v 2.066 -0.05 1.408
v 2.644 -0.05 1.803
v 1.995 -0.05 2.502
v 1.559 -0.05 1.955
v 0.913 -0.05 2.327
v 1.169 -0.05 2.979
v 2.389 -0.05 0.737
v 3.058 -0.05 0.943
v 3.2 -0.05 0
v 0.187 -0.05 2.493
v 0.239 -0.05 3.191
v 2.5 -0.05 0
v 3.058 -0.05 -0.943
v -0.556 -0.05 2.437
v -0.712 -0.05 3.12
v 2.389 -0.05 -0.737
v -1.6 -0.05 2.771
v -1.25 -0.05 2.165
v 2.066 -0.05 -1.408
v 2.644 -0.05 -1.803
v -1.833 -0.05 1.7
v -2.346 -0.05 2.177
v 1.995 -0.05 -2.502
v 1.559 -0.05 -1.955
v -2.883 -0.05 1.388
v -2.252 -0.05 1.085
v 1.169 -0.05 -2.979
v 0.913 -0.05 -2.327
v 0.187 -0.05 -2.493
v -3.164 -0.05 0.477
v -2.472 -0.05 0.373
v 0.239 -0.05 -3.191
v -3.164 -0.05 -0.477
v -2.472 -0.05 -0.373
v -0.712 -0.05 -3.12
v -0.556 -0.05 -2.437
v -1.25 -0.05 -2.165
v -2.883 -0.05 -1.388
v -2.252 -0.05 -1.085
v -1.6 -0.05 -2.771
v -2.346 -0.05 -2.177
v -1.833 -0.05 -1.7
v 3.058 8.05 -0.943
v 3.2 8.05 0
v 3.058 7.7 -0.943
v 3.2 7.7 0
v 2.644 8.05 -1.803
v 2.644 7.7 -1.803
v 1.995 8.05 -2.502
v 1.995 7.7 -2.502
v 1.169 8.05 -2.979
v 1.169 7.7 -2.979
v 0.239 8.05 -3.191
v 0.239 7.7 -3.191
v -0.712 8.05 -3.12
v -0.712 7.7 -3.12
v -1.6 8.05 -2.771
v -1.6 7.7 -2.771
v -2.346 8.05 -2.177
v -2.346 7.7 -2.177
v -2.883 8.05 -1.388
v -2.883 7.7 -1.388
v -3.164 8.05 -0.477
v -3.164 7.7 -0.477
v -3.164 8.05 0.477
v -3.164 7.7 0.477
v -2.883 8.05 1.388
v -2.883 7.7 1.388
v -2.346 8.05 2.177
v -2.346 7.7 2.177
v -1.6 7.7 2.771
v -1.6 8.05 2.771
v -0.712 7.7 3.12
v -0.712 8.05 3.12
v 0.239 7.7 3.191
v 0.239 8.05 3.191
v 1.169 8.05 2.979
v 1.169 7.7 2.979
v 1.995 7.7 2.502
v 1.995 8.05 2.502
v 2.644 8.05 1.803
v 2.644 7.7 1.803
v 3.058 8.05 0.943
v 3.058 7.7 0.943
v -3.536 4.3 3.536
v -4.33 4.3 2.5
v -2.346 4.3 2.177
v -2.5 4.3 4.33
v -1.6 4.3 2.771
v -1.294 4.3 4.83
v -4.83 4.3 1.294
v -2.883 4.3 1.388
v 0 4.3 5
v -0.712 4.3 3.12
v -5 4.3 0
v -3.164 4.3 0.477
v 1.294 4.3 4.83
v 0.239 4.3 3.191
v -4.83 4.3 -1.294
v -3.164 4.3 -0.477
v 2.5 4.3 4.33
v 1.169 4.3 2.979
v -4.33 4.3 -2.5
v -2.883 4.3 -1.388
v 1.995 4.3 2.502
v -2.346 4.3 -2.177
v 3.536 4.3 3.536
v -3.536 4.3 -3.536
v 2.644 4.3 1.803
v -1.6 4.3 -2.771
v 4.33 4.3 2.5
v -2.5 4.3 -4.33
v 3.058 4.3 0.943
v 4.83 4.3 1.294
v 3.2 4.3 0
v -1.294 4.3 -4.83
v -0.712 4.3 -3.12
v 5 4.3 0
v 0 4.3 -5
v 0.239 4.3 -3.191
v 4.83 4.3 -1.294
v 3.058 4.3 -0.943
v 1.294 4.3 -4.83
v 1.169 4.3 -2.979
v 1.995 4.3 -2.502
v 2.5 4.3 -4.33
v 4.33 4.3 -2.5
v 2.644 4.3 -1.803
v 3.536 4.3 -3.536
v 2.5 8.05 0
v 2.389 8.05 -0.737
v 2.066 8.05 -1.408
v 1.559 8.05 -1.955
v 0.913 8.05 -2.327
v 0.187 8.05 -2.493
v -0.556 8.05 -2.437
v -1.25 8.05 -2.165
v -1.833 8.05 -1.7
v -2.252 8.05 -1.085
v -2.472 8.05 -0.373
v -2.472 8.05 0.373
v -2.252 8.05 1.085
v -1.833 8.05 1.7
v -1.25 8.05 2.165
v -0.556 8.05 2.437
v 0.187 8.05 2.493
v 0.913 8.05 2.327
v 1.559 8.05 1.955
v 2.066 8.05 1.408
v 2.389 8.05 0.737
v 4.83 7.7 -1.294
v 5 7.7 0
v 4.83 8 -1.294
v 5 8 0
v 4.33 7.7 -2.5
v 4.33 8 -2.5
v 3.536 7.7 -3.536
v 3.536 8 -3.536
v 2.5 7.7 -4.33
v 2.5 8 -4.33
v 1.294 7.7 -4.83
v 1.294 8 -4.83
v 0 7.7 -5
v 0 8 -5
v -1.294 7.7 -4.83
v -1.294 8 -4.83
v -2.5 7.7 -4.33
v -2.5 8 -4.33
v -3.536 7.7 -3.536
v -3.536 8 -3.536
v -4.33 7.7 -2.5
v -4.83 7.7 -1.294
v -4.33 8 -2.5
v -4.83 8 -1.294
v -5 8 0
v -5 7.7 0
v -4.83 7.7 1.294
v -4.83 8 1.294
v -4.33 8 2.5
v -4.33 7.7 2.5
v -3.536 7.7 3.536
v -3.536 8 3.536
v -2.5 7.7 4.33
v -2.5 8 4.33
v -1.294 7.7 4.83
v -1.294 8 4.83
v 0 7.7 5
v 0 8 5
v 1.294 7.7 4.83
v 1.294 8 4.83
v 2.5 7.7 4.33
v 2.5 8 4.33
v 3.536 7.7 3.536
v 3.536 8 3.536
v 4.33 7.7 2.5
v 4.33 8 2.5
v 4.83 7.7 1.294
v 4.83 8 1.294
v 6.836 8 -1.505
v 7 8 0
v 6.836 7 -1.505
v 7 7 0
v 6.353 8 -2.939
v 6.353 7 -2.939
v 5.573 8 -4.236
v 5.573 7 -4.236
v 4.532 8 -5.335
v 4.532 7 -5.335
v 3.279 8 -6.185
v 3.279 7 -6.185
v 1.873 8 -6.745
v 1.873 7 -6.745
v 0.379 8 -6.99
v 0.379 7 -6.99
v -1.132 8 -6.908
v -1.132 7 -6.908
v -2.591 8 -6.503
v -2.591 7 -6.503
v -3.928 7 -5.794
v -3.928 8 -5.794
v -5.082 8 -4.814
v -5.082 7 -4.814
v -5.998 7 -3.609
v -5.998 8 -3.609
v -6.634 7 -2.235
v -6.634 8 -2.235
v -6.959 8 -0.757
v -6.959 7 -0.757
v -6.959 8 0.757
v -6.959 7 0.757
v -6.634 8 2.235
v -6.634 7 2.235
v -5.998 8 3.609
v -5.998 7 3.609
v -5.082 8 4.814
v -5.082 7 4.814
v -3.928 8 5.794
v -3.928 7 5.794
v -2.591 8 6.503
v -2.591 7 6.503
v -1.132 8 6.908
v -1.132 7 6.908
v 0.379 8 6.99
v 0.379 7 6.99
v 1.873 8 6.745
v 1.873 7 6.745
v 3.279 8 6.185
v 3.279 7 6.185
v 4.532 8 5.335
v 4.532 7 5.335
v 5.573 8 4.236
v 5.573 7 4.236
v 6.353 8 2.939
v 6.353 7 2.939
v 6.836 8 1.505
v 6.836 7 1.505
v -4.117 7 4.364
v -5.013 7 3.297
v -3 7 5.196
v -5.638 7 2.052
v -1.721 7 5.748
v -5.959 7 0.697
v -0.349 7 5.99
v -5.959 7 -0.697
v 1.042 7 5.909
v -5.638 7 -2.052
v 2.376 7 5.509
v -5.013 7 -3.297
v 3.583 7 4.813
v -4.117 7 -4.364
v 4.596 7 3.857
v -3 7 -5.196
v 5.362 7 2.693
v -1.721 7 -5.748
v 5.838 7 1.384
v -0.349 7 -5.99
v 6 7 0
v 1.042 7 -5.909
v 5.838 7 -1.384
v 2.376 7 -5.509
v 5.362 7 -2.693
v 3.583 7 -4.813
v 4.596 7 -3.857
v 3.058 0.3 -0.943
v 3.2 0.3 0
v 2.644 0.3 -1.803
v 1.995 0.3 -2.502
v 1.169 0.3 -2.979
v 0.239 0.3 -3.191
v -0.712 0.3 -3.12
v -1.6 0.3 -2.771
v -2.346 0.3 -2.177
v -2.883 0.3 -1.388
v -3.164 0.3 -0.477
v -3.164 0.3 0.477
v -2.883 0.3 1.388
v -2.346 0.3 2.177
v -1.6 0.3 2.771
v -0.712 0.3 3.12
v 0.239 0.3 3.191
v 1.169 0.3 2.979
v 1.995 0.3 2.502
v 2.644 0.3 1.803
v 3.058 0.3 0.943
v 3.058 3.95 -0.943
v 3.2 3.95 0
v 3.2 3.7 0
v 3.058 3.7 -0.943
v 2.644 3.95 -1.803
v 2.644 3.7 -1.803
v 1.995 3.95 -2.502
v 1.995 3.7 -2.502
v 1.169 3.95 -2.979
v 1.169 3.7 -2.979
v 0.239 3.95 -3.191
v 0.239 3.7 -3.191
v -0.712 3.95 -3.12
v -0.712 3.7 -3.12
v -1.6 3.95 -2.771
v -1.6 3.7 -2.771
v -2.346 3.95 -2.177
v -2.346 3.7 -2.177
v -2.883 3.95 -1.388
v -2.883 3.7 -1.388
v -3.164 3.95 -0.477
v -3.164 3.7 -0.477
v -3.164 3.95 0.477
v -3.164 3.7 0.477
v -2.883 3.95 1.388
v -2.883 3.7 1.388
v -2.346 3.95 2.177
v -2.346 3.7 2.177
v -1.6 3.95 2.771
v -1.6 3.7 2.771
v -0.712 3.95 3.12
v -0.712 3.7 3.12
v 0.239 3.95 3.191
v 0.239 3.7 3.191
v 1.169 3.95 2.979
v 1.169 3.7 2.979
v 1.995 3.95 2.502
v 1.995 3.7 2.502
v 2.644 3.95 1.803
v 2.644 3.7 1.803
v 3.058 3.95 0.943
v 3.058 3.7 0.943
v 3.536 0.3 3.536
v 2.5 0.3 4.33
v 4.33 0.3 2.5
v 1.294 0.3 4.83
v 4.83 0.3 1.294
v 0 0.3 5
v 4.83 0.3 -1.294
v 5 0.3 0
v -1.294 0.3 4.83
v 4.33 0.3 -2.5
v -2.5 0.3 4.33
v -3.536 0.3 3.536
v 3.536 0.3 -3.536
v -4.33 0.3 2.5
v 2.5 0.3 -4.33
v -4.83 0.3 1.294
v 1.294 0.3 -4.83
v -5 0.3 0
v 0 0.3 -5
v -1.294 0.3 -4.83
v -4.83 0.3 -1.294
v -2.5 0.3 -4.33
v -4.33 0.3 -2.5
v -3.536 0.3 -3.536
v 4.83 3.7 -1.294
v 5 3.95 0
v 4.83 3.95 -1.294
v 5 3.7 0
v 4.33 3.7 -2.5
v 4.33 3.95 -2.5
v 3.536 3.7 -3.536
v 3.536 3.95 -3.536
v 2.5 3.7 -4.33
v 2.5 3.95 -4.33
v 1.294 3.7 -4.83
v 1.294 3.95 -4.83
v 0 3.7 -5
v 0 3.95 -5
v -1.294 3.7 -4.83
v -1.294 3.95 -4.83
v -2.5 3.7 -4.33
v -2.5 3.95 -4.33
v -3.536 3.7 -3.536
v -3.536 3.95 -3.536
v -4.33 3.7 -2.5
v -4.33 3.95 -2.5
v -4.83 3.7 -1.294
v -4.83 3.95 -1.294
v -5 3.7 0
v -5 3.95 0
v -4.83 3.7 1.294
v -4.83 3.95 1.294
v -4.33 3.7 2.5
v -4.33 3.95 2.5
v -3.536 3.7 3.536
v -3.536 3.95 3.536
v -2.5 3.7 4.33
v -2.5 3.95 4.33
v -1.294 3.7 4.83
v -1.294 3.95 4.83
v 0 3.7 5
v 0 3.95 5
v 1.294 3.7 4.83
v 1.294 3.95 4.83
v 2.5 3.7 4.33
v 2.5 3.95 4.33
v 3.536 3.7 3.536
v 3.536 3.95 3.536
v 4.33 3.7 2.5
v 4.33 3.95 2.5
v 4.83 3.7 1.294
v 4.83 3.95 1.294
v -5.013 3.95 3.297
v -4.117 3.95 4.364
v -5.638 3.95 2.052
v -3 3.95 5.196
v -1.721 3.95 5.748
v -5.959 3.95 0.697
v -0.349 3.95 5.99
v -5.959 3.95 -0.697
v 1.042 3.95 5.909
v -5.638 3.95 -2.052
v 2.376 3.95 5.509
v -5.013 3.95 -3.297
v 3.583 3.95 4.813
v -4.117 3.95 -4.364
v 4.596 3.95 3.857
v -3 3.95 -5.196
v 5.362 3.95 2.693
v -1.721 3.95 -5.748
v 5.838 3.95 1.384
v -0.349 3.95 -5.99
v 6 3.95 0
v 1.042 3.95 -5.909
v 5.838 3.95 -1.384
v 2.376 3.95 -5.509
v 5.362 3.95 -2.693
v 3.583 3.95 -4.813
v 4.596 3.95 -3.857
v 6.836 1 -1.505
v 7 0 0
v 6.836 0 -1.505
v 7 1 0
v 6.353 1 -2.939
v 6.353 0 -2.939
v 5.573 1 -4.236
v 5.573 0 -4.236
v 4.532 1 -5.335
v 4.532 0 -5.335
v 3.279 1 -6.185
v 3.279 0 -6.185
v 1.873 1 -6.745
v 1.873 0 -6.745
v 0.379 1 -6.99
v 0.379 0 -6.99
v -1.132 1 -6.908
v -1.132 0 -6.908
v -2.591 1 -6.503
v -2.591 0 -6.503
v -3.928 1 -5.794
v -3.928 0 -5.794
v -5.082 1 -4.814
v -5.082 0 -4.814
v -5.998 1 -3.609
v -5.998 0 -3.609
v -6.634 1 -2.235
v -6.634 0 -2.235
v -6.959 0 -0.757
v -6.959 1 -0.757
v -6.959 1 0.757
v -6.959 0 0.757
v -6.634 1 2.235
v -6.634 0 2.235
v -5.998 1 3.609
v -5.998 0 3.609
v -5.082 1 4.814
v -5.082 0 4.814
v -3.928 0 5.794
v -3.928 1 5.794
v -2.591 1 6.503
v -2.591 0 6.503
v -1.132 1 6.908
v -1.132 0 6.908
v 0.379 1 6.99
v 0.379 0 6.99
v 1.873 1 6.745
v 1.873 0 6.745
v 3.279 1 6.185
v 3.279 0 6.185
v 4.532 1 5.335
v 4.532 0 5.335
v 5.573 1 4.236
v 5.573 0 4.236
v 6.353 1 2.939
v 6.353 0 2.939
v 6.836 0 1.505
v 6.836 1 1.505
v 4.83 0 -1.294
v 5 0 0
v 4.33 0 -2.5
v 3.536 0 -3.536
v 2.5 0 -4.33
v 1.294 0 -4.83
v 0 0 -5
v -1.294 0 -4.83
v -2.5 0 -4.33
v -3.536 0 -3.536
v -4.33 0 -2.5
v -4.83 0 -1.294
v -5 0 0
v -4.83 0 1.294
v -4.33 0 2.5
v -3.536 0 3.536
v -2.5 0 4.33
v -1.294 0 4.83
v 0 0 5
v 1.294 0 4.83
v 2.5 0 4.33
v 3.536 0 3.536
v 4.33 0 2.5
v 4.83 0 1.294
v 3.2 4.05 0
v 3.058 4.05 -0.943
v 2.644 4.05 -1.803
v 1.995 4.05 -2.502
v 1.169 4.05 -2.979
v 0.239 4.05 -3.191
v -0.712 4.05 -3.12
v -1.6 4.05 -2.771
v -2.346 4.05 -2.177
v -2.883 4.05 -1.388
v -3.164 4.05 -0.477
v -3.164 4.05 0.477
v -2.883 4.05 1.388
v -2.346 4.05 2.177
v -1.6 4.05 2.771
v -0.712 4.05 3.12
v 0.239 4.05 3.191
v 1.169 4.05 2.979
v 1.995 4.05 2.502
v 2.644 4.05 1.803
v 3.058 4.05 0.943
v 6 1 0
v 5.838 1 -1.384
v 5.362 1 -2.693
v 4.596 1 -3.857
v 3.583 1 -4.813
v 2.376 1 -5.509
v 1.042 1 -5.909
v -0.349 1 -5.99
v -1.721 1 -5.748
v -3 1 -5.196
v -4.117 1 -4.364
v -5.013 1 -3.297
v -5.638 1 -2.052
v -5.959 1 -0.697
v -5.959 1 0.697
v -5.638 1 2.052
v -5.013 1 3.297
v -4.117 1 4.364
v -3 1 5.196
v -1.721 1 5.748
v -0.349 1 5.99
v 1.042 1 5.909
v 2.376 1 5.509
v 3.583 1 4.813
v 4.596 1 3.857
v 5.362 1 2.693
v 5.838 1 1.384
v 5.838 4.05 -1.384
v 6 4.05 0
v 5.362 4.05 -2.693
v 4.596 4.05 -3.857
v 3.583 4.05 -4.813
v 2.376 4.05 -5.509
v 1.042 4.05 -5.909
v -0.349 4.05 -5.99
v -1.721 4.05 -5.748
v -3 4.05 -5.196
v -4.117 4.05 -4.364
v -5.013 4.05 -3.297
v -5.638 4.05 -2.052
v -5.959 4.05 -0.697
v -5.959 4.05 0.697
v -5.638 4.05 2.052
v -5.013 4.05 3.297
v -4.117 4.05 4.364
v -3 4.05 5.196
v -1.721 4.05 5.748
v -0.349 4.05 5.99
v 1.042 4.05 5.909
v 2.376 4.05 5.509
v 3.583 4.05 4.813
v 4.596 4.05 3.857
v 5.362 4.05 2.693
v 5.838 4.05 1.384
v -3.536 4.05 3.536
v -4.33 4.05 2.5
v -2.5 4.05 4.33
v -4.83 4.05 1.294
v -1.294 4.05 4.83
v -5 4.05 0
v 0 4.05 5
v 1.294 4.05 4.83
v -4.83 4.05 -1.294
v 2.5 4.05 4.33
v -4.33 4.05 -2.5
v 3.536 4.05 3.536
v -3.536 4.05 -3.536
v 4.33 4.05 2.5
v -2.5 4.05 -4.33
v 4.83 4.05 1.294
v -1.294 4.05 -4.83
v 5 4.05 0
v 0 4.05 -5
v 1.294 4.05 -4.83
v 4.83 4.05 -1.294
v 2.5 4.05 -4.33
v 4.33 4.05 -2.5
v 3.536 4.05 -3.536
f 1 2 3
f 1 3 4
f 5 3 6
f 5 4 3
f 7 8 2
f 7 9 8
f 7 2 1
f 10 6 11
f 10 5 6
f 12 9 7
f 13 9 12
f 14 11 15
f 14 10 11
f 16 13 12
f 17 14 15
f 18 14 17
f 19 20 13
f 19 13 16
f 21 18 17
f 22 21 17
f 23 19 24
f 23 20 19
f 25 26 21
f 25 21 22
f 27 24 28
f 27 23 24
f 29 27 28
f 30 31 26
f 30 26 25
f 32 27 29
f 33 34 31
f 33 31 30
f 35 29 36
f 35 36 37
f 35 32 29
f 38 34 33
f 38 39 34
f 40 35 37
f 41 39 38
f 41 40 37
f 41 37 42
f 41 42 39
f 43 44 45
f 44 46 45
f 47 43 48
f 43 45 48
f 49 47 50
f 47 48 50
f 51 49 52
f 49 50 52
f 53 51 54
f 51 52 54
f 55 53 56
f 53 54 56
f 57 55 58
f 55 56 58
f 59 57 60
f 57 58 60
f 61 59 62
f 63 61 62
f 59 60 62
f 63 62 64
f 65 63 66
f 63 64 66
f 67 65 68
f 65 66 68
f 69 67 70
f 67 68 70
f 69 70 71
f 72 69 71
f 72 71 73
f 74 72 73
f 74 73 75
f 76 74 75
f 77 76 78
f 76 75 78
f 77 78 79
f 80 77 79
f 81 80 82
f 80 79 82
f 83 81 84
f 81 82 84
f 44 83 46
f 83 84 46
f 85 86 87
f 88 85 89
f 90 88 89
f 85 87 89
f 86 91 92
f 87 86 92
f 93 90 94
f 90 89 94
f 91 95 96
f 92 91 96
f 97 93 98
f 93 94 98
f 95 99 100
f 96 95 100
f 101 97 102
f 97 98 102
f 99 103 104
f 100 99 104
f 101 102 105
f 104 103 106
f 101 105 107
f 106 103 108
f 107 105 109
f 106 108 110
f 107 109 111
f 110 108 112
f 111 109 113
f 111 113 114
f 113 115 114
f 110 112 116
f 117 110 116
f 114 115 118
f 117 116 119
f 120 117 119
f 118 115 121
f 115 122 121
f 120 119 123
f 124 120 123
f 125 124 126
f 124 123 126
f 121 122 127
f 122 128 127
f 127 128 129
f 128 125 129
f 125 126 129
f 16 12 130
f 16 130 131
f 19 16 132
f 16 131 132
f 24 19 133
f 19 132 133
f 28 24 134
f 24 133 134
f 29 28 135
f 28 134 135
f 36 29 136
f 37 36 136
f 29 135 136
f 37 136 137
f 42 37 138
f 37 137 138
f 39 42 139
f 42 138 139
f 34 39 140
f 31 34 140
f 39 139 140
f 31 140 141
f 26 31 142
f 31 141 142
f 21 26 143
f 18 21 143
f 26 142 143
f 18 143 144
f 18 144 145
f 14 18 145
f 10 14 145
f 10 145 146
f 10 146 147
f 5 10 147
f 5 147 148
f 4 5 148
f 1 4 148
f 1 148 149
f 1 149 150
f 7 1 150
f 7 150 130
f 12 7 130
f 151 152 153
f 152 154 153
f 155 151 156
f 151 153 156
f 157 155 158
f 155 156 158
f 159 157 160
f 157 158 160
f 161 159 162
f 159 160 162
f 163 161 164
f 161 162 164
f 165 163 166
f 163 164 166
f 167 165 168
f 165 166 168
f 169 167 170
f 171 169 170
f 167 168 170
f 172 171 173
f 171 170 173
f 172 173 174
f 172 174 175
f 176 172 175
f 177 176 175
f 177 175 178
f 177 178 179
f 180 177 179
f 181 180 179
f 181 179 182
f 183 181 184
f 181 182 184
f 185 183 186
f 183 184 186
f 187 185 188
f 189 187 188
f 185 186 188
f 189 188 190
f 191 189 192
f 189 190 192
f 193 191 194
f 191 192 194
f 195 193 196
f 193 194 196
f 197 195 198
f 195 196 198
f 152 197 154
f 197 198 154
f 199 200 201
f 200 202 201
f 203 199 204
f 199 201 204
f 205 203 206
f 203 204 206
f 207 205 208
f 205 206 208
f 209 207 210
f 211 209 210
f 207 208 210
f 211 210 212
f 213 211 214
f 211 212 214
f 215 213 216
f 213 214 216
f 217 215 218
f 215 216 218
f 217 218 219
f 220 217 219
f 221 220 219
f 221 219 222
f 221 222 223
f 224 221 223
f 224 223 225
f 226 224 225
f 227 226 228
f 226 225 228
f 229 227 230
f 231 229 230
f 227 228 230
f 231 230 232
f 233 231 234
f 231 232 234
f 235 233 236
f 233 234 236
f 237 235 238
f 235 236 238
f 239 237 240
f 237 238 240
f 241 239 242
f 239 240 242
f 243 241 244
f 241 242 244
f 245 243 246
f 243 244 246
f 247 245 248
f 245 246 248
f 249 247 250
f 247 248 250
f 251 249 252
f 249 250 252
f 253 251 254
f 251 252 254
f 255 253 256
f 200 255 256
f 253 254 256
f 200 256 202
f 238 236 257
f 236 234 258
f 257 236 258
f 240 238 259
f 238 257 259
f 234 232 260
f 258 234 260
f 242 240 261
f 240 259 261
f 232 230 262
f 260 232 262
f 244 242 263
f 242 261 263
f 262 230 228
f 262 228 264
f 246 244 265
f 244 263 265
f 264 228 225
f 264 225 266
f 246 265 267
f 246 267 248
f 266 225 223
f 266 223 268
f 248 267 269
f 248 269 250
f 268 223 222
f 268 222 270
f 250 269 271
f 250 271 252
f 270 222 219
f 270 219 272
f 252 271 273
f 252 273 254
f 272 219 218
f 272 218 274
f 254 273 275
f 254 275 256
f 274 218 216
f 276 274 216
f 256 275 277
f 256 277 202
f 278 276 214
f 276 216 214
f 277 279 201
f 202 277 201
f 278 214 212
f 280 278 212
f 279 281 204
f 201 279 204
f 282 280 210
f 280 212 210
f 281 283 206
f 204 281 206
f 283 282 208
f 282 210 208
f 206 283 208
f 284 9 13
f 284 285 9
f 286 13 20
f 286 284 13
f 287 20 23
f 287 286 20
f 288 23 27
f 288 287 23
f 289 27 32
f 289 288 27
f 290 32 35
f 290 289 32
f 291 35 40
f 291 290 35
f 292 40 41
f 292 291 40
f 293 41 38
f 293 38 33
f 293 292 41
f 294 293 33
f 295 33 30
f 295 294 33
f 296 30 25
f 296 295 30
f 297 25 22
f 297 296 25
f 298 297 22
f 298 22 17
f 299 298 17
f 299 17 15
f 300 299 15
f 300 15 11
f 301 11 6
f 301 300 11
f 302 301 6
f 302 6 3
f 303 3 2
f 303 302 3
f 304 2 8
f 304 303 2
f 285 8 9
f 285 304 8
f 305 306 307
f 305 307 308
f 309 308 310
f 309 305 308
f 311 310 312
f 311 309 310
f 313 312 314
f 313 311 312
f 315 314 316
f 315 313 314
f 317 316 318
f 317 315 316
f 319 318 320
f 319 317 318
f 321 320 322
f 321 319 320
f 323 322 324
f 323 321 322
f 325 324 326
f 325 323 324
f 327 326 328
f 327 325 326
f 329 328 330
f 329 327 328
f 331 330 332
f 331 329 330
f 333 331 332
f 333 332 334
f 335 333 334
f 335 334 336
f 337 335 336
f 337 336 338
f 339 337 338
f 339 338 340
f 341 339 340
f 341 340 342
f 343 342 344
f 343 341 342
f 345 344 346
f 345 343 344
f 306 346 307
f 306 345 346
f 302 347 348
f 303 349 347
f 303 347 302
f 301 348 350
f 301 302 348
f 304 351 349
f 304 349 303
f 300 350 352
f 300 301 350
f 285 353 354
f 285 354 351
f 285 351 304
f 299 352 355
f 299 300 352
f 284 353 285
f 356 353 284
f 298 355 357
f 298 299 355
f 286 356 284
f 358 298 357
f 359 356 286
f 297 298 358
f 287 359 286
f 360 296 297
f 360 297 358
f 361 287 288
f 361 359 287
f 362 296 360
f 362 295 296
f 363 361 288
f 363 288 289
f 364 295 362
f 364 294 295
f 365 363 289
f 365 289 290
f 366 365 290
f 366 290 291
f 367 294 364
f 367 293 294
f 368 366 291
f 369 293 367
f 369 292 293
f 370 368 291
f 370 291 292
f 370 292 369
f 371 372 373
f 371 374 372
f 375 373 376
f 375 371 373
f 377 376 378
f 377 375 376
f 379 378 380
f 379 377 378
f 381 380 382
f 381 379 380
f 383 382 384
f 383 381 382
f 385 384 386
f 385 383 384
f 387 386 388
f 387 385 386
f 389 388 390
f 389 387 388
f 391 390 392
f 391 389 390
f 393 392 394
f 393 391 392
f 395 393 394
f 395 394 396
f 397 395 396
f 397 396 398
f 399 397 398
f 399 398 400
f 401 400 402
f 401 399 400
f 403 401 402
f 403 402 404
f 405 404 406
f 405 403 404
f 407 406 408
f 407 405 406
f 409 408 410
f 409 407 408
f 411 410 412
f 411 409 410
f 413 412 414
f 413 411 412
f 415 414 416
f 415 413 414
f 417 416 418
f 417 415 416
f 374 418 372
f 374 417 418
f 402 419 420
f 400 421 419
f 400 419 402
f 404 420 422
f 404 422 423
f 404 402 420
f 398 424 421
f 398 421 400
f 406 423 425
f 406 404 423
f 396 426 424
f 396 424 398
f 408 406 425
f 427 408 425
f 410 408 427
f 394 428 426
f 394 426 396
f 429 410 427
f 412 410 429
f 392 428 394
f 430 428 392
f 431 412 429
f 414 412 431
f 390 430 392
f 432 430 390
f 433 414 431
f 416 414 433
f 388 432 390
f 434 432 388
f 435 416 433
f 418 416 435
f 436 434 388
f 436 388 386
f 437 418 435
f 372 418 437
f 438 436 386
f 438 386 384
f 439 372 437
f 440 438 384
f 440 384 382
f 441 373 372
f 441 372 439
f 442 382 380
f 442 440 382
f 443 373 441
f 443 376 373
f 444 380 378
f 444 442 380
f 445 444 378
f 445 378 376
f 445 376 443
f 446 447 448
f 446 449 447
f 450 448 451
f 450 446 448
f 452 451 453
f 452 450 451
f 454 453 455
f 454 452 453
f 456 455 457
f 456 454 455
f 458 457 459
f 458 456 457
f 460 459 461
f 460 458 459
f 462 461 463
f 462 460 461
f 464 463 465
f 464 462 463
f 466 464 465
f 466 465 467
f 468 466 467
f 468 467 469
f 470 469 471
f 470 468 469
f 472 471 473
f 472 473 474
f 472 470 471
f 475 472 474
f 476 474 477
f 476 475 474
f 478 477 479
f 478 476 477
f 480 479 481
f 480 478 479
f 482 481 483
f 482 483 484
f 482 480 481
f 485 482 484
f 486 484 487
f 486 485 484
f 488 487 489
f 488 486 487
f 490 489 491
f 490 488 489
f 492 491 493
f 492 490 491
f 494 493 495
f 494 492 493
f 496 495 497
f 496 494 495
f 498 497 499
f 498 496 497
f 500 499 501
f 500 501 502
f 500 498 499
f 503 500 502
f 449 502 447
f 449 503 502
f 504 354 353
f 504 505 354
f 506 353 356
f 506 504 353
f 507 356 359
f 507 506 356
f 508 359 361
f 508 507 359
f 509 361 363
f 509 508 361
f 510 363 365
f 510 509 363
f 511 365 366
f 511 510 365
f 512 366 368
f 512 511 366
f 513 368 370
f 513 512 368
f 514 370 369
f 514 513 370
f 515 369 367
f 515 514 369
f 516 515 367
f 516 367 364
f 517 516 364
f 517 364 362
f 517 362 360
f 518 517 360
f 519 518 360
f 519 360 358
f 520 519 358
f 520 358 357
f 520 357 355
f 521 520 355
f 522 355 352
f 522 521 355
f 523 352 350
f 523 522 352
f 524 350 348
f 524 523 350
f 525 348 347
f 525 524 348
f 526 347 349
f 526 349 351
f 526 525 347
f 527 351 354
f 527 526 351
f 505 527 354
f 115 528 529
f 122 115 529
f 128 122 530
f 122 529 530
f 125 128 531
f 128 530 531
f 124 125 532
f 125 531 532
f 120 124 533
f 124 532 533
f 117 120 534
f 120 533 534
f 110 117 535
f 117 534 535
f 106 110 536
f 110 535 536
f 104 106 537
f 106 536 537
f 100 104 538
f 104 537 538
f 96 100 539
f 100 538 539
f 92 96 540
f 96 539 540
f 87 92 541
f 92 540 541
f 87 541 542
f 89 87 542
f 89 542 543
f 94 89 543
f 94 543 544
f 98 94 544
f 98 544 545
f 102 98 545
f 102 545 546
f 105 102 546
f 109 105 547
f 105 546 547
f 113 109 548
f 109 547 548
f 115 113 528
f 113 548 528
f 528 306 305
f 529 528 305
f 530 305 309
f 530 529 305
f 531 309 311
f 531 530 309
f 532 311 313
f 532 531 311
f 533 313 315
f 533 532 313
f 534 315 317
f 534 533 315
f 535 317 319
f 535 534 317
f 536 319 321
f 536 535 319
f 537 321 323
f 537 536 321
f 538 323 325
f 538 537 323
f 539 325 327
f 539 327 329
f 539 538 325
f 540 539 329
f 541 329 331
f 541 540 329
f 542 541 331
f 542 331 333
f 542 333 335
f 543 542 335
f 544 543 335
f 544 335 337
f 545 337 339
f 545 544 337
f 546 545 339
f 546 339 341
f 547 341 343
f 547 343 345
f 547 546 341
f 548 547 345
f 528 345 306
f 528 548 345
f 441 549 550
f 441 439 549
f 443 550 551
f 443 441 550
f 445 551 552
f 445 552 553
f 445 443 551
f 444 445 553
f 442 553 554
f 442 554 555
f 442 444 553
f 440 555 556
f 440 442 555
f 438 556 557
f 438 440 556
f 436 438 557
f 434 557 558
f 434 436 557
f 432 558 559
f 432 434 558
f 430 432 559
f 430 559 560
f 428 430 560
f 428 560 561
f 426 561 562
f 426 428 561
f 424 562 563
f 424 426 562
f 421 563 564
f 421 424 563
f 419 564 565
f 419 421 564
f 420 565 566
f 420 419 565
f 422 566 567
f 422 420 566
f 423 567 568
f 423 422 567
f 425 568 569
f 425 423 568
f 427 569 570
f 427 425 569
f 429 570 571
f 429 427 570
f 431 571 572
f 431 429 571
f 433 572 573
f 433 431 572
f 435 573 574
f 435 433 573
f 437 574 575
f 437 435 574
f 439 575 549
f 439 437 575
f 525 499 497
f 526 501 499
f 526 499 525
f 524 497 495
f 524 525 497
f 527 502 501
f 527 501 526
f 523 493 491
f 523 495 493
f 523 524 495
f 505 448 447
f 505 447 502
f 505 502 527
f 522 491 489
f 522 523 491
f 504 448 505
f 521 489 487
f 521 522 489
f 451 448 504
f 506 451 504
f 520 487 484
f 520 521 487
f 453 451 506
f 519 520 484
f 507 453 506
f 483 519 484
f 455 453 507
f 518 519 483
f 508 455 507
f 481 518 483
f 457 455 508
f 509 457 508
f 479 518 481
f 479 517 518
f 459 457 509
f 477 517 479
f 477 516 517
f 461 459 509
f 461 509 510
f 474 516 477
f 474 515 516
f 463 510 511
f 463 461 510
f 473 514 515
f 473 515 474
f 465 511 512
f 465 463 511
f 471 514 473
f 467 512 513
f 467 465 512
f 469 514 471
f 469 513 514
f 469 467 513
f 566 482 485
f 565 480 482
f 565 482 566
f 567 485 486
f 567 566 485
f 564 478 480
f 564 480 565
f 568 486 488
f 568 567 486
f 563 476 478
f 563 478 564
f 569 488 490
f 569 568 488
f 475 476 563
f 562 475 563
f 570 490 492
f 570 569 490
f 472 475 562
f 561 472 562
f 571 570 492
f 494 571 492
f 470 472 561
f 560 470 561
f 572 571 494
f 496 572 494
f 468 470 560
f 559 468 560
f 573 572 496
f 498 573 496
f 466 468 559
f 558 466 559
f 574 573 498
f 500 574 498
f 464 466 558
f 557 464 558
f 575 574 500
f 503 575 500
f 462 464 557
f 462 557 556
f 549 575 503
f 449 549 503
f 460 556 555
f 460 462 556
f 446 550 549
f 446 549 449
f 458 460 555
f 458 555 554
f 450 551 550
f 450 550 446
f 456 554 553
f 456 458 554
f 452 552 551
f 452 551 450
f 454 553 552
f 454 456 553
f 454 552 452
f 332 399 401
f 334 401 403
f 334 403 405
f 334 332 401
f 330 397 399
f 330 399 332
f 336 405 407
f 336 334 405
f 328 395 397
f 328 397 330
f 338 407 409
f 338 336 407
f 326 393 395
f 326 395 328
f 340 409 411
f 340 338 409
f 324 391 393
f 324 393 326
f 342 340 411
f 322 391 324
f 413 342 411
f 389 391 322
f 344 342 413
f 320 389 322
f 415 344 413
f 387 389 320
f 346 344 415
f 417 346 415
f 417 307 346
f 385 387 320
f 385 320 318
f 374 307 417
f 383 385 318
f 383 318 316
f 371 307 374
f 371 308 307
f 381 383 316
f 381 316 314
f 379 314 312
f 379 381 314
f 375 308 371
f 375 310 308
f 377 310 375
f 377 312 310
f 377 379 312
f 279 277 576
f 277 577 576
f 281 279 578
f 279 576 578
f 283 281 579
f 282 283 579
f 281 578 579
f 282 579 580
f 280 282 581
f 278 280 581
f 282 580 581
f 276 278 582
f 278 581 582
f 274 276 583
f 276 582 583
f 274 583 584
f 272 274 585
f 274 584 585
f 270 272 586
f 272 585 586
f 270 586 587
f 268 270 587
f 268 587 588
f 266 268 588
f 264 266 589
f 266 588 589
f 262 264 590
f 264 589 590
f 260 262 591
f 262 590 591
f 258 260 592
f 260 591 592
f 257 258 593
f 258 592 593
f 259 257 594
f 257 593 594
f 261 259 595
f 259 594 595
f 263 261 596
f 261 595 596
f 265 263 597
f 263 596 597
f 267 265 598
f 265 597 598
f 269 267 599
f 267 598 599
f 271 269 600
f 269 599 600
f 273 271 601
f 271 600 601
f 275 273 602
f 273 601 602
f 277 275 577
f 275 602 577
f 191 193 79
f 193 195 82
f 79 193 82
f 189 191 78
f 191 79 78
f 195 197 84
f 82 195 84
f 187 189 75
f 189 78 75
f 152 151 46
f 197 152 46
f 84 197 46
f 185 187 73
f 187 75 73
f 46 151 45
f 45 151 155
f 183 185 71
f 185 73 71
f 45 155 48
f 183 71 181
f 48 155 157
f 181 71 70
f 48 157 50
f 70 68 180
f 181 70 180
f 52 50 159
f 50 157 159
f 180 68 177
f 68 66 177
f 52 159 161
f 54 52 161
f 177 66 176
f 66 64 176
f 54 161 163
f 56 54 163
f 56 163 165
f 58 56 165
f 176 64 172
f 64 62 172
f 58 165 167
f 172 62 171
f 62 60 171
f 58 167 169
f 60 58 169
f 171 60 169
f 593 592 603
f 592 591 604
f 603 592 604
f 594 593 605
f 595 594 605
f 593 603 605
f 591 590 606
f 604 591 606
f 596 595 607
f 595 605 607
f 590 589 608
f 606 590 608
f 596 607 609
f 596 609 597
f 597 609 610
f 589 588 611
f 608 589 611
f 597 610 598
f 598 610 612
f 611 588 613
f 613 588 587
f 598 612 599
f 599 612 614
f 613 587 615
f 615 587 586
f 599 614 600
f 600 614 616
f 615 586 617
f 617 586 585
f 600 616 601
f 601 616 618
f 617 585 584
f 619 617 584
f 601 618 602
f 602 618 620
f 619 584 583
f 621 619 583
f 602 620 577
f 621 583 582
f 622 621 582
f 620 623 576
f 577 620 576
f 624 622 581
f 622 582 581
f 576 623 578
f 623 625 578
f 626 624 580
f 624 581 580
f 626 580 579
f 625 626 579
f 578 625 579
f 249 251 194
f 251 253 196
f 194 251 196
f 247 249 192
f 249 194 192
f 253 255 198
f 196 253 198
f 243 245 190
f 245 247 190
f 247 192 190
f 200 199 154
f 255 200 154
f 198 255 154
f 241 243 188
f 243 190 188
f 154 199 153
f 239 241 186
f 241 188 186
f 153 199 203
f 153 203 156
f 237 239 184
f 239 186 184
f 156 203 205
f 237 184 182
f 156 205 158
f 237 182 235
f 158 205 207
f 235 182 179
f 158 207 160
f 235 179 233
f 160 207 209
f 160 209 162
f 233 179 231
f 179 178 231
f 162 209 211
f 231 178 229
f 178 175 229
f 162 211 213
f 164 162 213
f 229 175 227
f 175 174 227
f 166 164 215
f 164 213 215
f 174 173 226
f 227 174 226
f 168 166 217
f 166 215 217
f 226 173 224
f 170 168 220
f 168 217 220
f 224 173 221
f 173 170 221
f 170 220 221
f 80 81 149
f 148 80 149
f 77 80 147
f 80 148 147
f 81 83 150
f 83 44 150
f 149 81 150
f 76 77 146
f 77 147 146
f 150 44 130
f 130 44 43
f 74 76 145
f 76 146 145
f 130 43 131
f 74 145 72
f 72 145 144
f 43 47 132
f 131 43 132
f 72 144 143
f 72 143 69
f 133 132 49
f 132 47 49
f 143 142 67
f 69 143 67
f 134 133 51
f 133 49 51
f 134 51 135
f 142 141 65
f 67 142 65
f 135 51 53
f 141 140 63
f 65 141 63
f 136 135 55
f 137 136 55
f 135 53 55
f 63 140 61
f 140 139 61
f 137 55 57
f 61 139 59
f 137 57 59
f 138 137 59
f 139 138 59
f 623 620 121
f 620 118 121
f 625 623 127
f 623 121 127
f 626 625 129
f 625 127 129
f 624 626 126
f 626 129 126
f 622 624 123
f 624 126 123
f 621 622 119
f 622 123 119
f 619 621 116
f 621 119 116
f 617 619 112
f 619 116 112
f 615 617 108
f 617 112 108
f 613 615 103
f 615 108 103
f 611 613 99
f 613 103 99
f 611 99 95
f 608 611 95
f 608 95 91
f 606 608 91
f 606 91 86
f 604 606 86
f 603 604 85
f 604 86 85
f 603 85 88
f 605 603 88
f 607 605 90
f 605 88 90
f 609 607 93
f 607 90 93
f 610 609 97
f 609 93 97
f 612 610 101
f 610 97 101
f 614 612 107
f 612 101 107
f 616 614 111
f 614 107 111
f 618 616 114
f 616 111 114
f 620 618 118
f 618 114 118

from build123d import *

# Parameters (mm, degrees)
SKETCH_1_W = 0.7
SKETCH_1_H = 0.05


with BuildPart() as part:
    # 草图1 → 旋转1 (revolve)
    with BuildSketch(Plane.XY):
        Polygon((2.5, 4), (2.5, 0), (3.2, 0), (3.2, 0.3), (5, 0.3), (5, 0), (7, 0), (7, 1), (6, 1), (6, 3.95), (5, 3.95), (5, 3.7), (3.2, 3.7), (3.2, 4), align=None)
        with Locations((2.85, -0.025)):
            Rectangle(SKETCH_1_W, SKETCH_1_H)
        with Locations((2.85, 4.025)):
            Rectangle(SKETCH_1_W, SKETCH_1_H)
    revolve_1 = revolve(axis=Axis((0, -1000, 0), (0, 1, 0)))

    # 镜向1: 旋转1 across plane
    add(revolve_1.mirror(Plane.ZX.offset(4)))


solid = part.part
